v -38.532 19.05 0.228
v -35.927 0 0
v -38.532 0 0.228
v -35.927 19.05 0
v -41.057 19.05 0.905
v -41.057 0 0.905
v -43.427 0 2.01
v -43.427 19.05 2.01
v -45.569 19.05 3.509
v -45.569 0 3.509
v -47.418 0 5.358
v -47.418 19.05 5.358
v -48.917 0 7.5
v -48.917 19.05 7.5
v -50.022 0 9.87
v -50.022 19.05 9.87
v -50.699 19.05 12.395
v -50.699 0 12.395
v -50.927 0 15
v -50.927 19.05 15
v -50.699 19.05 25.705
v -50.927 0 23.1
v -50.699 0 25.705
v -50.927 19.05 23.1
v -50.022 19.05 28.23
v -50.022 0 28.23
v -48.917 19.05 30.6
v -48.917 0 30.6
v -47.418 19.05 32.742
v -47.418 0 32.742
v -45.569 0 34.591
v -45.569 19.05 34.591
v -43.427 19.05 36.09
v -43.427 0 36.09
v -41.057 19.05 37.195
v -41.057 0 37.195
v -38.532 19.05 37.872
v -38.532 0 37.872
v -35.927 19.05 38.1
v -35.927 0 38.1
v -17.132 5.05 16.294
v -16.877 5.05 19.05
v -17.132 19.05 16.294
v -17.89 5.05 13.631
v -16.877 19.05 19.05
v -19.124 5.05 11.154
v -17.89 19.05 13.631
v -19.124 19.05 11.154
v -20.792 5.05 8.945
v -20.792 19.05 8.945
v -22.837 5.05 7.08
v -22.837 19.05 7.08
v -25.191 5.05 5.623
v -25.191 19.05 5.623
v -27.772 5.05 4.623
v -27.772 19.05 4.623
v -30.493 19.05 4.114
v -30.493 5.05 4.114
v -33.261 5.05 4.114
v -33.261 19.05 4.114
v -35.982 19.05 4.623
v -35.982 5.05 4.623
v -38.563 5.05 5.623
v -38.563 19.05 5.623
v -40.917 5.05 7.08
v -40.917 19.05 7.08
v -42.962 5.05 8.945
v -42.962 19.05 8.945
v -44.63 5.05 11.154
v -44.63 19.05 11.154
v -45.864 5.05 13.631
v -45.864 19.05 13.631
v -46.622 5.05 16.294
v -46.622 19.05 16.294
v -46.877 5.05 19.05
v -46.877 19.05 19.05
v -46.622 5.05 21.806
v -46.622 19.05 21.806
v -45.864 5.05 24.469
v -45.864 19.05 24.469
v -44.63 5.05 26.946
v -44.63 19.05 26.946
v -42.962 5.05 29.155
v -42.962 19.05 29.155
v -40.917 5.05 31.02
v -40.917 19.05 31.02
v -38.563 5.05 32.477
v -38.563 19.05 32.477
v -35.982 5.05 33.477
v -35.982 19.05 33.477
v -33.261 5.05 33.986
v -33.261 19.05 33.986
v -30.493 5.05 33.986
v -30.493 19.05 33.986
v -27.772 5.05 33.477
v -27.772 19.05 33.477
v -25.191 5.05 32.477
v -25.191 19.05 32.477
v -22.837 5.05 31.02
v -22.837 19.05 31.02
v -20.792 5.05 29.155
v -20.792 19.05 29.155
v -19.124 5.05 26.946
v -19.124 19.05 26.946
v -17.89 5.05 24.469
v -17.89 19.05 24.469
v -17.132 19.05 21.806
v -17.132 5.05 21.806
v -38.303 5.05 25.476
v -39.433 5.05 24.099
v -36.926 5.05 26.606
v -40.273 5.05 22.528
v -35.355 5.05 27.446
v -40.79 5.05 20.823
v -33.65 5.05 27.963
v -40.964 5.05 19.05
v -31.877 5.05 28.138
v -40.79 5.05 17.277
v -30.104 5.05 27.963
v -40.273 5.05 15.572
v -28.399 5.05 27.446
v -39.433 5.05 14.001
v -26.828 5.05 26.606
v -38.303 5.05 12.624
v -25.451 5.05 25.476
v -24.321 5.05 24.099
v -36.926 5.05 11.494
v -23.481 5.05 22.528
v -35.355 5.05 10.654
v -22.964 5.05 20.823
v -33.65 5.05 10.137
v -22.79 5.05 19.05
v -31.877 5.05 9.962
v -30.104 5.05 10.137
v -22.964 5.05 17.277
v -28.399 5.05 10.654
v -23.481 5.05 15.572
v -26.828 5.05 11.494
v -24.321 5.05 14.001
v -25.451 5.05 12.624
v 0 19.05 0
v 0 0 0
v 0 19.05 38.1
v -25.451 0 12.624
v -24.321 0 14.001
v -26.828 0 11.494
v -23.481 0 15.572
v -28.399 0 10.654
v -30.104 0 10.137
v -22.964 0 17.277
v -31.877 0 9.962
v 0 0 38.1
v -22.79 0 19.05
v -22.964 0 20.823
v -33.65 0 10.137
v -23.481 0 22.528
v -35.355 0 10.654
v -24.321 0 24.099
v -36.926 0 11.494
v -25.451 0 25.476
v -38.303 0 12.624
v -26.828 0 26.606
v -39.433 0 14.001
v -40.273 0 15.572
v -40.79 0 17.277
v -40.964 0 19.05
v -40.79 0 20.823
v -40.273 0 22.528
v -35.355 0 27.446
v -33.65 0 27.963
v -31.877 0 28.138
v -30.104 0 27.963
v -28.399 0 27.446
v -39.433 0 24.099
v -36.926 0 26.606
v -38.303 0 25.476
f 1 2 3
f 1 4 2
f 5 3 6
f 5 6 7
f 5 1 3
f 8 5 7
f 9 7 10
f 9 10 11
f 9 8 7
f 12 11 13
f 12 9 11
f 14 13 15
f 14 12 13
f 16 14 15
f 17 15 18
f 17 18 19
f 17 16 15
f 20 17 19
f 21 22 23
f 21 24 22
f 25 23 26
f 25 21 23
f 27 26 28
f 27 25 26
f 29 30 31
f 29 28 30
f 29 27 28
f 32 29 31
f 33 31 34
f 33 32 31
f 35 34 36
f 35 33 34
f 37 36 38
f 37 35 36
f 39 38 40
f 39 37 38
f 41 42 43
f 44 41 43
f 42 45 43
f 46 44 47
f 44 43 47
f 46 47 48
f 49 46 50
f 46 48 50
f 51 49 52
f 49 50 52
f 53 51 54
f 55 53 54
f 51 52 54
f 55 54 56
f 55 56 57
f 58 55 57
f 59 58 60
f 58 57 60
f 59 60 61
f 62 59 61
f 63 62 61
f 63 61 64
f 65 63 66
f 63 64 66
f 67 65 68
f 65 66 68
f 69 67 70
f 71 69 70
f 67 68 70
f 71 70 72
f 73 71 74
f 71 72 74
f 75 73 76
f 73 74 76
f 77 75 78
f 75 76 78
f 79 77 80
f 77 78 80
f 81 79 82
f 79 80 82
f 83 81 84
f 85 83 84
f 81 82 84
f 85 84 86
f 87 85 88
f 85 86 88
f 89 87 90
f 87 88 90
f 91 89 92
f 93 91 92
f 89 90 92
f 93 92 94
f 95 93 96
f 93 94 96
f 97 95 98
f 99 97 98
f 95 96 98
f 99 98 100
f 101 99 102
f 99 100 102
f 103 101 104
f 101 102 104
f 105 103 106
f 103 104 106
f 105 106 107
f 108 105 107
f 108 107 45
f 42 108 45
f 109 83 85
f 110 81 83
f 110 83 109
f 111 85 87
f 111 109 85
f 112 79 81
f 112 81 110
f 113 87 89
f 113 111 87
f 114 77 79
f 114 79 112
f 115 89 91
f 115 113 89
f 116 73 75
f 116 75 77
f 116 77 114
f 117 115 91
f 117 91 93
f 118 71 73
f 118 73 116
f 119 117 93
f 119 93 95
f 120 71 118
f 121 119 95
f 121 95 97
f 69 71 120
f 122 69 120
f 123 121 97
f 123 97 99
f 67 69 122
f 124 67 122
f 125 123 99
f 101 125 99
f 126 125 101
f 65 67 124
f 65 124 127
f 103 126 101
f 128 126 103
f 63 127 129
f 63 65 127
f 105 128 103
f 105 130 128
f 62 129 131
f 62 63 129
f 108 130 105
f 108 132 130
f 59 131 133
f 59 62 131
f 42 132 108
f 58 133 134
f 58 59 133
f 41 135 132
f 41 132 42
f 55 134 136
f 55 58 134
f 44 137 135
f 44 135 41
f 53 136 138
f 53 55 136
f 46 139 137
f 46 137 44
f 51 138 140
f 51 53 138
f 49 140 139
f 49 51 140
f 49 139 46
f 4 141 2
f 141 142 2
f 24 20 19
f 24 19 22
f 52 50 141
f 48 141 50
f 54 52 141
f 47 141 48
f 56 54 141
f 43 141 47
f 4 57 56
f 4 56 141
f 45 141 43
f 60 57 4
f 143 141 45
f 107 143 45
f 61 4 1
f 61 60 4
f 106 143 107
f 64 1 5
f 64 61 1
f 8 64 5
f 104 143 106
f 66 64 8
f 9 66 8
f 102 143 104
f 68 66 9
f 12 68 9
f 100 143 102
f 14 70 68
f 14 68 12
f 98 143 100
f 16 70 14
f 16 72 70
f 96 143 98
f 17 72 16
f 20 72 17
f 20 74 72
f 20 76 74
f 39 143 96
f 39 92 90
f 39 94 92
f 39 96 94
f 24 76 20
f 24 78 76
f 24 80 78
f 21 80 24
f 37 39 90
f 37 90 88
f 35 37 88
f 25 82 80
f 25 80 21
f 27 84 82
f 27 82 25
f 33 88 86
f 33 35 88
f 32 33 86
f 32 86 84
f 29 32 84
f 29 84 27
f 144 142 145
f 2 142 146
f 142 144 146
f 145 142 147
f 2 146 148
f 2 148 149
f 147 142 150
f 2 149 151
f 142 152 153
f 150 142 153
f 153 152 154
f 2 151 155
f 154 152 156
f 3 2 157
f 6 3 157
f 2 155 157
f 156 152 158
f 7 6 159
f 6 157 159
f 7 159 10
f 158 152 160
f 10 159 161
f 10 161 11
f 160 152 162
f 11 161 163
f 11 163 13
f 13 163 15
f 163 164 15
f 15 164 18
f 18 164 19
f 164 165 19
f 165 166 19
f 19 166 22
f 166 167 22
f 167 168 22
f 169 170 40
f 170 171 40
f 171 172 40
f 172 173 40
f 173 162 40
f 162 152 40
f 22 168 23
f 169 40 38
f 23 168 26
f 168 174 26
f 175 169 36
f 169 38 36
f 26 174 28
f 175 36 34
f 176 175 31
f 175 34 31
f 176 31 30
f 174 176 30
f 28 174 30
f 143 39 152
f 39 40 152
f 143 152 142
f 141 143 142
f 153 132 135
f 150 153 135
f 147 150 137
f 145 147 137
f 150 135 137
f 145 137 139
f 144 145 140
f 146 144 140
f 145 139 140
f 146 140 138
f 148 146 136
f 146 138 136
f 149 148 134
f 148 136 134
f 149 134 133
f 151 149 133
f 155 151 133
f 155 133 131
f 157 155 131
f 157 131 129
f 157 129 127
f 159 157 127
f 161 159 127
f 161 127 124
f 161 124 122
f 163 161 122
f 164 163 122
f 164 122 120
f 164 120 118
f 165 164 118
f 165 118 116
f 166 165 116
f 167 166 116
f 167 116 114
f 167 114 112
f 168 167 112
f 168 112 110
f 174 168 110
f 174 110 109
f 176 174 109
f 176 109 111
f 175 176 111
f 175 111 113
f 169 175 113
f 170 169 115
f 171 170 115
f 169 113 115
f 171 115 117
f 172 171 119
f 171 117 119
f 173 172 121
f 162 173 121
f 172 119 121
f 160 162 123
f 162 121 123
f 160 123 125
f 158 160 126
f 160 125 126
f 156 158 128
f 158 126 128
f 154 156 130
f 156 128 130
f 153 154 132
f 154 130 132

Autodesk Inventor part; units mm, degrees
ref_plane "YZ Plane" through (0, 0, 0) normal (1, 0, 0) x (0, 1, 0)
ref_plane "XZ Plane" through (0, 0, 0) normal (0, 1, 0) x (-1, 0, 0)
ref_plane "XY Plane" through (0, 0, 0) normal (0, 0, 1) x (1, 0, 0)
sketch "Sketch1" plane through (0, 0, 0) normal (0, 1, 0) x (-1, 0, 0)
  line L0 (0, 0) -> (50.927, 0)
  line L1 (50.927, 0) -> (50.927, 38.1)
  line L2 (50.927, 38.1) -> (0, 38.1)
  line L3 (0, 38.1) -> (0, 0)
  dimension "d0" = 50.927
  dimension "d1" = 38.1
extrude "Extrusion1" add sketch "Sketch1" along normal blind 19.05
sketch "Sketch2" plane through (0, 19.05, 0) normal (0, 1, 0) x (1, 0, 0)
  circle A0 centre (-31.877, -19.05) radius 15
  line L0 (-50.927, -38.1) -> (0, -38.1) projected
  point P0 (-50.927, 0)
  dimension "d4" = 30
  dimension "d5" = 19.05
  dimension "d6" = 19.05
  dimension "d15" = 19.05
extrude "Extrusion2" cut sketch "Sketch2" against normal blind 14
sketch "Sketch3" plane through (-31.877, 5.05, 19.05) normal (0, 1, 0) x (1, 0, 0)
  circle A0 centre (0, 0) radius 15 projected
  circle A1 centre (0, 0) radius 3.175
  circle A2 centre (0, 0) radius 9.0875
  point P0 (31.877, 19.05)
  dimension "d9" = 6.35
  dimension "d12" = 5.9125
  dimension "d13" = 5.9125
extrude "Extrusion3" cut sketch "Sketch3" against normal through all contours A1 | A2
fillet "Fillet1" radius 15 2 edges at (-50.927, 9.525, 0) (-50.927, 9.525, 38.1)
equation "\"d5\" = d15"
equation "\"d6\" = d15"
equation "\"d12\" = d13"
properties part number "acmeBearingBlock"
